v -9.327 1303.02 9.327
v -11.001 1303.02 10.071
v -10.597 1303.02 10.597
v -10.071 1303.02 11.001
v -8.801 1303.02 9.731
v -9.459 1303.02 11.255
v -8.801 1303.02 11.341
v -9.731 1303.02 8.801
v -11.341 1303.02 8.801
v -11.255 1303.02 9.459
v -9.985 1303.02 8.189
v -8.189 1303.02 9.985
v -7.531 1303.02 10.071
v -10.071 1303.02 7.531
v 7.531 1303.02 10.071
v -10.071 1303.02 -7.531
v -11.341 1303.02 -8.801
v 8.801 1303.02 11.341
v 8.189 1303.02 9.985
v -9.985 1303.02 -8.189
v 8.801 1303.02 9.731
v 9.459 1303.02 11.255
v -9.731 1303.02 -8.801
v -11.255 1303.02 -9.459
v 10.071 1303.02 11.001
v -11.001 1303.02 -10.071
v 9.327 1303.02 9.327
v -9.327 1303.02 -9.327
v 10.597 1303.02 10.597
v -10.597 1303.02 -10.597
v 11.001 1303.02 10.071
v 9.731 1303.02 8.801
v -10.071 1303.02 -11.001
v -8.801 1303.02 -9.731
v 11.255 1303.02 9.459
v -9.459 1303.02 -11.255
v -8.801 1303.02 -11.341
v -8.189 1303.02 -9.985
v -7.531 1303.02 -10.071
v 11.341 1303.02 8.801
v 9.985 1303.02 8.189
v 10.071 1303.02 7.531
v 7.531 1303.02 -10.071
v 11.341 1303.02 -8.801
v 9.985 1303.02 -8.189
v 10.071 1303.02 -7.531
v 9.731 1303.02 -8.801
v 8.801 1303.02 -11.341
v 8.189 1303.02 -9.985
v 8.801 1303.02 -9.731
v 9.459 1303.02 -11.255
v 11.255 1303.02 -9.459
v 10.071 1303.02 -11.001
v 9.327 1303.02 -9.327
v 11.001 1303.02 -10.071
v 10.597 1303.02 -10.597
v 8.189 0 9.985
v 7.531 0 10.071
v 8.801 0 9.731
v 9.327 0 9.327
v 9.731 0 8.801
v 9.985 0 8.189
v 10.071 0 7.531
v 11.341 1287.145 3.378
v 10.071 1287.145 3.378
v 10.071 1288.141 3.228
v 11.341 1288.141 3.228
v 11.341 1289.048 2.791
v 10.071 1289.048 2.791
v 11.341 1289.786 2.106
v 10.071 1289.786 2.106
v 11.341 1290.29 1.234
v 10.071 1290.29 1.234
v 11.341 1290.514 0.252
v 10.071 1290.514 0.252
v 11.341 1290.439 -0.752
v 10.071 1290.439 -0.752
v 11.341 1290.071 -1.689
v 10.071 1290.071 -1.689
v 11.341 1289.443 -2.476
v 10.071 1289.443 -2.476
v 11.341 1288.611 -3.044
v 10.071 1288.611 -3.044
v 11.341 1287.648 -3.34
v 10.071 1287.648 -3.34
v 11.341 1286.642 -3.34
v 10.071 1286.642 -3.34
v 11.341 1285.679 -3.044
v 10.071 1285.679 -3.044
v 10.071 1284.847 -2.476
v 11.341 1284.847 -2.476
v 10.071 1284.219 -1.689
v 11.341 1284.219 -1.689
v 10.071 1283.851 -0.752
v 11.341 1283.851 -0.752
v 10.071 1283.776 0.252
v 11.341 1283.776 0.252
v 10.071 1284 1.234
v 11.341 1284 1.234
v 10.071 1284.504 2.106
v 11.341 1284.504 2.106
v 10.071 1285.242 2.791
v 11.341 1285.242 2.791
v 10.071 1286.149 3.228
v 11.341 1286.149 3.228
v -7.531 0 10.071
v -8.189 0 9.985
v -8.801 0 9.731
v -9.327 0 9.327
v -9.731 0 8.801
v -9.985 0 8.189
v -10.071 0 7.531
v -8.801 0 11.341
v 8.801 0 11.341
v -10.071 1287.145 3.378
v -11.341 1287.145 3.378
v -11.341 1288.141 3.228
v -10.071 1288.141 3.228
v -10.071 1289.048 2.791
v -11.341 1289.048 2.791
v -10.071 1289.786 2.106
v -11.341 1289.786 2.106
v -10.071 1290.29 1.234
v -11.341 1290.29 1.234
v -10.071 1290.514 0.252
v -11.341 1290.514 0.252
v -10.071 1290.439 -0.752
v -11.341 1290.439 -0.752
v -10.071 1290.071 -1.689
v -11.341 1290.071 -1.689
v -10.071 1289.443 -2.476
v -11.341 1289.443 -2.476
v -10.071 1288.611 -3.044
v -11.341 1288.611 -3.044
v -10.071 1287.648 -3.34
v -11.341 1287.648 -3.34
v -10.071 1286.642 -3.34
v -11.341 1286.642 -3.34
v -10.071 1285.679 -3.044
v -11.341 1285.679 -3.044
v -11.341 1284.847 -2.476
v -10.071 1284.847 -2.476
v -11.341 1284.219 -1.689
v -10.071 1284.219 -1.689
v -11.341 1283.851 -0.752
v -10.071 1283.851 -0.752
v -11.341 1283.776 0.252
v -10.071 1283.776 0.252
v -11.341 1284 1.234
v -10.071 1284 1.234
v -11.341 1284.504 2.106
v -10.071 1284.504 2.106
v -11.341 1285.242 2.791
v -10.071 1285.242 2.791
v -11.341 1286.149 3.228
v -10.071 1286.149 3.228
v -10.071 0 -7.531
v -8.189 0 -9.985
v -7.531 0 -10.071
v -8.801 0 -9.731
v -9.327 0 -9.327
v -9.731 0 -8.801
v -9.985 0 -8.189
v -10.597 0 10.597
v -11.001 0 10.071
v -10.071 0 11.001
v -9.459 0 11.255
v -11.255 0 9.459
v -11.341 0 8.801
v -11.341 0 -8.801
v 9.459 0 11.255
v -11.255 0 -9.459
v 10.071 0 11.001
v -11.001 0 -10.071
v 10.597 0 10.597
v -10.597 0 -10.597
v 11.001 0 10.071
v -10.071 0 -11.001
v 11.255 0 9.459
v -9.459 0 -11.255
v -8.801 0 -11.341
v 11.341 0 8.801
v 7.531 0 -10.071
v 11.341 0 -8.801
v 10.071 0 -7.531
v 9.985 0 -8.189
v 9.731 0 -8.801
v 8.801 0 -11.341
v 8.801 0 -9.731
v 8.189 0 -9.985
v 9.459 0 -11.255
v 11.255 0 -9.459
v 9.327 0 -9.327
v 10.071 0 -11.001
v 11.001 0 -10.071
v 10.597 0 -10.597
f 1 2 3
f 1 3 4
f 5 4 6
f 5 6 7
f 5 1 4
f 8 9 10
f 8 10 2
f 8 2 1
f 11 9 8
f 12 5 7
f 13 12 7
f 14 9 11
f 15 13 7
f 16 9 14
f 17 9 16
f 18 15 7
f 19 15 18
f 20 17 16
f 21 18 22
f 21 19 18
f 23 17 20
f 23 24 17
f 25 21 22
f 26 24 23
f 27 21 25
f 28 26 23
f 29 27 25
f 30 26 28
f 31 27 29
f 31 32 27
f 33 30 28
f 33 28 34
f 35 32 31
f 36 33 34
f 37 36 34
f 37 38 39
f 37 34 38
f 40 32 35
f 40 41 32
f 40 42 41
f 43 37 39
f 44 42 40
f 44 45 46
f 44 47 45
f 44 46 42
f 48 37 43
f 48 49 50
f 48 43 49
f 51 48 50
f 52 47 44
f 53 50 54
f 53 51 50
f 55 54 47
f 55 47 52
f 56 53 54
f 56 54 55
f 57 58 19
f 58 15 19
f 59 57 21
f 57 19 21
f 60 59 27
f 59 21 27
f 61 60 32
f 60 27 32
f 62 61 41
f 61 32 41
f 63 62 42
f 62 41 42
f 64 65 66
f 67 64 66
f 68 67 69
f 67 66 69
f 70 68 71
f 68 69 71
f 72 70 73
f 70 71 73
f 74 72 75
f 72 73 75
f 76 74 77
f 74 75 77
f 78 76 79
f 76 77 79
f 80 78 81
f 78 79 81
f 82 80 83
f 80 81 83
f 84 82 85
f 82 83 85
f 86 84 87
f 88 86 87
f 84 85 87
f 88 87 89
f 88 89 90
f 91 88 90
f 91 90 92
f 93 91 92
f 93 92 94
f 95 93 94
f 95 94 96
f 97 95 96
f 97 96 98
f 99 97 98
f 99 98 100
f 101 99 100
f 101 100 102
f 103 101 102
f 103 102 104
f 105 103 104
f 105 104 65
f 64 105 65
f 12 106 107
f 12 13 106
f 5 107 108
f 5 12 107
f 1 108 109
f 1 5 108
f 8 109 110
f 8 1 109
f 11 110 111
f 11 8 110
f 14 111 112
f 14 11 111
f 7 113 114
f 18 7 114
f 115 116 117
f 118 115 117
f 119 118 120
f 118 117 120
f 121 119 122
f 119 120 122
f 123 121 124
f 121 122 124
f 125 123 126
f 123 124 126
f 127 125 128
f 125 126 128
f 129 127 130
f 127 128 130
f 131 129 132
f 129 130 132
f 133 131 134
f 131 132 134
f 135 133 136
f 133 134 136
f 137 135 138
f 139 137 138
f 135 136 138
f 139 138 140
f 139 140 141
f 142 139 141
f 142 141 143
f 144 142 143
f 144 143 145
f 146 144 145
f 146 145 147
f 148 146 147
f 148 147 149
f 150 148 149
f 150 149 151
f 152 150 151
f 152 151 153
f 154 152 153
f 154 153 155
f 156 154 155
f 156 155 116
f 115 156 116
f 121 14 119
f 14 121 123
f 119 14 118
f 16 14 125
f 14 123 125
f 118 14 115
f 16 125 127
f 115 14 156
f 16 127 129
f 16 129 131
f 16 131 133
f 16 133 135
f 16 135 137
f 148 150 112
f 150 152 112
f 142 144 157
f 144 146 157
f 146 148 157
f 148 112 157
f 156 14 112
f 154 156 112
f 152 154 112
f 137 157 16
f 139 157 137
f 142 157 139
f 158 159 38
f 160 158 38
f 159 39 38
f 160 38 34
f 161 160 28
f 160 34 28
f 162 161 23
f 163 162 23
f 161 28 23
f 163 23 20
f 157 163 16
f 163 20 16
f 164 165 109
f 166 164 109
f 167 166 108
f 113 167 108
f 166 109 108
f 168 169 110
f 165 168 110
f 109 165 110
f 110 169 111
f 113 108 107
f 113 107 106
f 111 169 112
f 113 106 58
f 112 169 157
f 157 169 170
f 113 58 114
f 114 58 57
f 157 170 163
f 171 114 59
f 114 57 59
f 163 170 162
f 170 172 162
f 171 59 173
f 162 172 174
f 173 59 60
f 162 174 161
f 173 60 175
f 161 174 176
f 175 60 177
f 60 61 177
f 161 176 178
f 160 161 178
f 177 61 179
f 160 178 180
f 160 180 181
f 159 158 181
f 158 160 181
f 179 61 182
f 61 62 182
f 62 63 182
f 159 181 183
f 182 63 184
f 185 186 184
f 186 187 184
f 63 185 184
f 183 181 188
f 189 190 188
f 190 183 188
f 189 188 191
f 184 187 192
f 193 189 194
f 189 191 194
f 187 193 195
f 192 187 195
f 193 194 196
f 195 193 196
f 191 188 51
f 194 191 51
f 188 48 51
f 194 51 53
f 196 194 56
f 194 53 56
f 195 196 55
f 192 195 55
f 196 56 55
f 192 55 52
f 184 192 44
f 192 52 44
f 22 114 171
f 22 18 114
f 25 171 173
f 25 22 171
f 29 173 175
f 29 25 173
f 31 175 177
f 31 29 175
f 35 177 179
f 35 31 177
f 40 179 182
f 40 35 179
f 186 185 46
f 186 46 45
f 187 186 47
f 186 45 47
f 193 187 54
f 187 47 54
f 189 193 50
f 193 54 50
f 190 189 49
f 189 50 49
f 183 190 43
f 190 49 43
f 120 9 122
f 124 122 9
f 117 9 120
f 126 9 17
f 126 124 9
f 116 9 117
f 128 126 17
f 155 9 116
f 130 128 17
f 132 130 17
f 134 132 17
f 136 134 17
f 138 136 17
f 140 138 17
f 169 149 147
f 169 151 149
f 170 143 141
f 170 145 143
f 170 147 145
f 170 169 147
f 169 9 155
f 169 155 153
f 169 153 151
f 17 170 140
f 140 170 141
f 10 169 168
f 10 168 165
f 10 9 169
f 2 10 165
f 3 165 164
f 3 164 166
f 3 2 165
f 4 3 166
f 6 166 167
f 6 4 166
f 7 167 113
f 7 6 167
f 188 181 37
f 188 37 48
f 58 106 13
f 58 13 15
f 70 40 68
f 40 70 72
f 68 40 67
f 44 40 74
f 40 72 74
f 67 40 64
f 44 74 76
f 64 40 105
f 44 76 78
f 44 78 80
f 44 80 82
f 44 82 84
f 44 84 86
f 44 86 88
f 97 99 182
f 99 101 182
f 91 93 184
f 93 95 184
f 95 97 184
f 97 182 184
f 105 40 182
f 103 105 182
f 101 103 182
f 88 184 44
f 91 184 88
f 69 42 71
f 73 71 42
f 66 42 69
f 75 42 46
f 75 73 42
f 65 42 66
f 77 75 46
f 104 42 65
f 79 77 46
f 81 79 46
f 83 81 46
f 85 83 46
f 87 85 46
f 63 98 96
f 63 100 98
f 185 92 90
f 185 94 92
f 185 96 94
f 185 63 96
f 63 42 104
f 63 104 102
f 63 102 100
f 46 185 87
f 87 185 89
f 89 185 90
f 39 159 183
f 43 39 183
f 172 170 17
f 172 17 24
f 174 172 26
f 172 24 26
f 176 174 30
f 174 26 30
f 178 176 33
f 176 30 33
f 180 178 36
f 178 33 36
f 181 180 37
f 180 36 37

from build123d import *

# Parameters (mm, degrees)
SKETCH1_W               = 22.6822
SKETCH1_H               = 22.6822
SKETCH1_W_2             = 20.1422
SKETCH1_H_2             = 20.1422
BOSS_EXTRUDE1_DEPTH     = 1303.02
FILLET1_R               = 2.54
F_1_4_CLEARANCE_HOLE1_D = 6.7564


with BuildPart() as part:
    # Sketch1 → Boss-Extrude1 (new body)
    with BuildSketch(Plane(origin=(0, 0, 0), x_dir=(1, 0, 0), z_dir=(0, 1, 0))):
        Rectangle(SKETCH1_W, SKETCH1_H)
        Rectangle(SKETCH1_W_2, SKETCH1_H_2, mode=Mode.SUBTRACT)
    extrude(amount=BOSS_EXTRUDE1_DEPTH)

    # Fillet1
    fillet1_edges = [part.edges().sort_by_distance(p)[0] for p in [
        (10.0711, 651.51, 10.0711),
        (10.0711, 651.51, -10.0711),
        (-10.0711, 651.51, -10.0711),
        (-10.0711, 651.51, 10.0711),
        (11.3411, 651.51, 11.3411),
        (-11.3411, 651.51, 11.3411),
        (-11.3411, 651.51, -11.3411),
        (11.3411, 651.51, -11.3411),
    ]]
    fillet(fillet1_edges, radius=FILLET1_R)

    # 1/4 Clearance Hole1 (through all)
    with Locations(Plane(origin=(11.3411, 0, 0), x_dir=(0, 0, -1), z_dir=(1, 0, 0))):
        with Locations((0, 1287.145)):
            Hole(F_1_4_CLEARANCE_HOLE1_D / 2)


solid = part.part
